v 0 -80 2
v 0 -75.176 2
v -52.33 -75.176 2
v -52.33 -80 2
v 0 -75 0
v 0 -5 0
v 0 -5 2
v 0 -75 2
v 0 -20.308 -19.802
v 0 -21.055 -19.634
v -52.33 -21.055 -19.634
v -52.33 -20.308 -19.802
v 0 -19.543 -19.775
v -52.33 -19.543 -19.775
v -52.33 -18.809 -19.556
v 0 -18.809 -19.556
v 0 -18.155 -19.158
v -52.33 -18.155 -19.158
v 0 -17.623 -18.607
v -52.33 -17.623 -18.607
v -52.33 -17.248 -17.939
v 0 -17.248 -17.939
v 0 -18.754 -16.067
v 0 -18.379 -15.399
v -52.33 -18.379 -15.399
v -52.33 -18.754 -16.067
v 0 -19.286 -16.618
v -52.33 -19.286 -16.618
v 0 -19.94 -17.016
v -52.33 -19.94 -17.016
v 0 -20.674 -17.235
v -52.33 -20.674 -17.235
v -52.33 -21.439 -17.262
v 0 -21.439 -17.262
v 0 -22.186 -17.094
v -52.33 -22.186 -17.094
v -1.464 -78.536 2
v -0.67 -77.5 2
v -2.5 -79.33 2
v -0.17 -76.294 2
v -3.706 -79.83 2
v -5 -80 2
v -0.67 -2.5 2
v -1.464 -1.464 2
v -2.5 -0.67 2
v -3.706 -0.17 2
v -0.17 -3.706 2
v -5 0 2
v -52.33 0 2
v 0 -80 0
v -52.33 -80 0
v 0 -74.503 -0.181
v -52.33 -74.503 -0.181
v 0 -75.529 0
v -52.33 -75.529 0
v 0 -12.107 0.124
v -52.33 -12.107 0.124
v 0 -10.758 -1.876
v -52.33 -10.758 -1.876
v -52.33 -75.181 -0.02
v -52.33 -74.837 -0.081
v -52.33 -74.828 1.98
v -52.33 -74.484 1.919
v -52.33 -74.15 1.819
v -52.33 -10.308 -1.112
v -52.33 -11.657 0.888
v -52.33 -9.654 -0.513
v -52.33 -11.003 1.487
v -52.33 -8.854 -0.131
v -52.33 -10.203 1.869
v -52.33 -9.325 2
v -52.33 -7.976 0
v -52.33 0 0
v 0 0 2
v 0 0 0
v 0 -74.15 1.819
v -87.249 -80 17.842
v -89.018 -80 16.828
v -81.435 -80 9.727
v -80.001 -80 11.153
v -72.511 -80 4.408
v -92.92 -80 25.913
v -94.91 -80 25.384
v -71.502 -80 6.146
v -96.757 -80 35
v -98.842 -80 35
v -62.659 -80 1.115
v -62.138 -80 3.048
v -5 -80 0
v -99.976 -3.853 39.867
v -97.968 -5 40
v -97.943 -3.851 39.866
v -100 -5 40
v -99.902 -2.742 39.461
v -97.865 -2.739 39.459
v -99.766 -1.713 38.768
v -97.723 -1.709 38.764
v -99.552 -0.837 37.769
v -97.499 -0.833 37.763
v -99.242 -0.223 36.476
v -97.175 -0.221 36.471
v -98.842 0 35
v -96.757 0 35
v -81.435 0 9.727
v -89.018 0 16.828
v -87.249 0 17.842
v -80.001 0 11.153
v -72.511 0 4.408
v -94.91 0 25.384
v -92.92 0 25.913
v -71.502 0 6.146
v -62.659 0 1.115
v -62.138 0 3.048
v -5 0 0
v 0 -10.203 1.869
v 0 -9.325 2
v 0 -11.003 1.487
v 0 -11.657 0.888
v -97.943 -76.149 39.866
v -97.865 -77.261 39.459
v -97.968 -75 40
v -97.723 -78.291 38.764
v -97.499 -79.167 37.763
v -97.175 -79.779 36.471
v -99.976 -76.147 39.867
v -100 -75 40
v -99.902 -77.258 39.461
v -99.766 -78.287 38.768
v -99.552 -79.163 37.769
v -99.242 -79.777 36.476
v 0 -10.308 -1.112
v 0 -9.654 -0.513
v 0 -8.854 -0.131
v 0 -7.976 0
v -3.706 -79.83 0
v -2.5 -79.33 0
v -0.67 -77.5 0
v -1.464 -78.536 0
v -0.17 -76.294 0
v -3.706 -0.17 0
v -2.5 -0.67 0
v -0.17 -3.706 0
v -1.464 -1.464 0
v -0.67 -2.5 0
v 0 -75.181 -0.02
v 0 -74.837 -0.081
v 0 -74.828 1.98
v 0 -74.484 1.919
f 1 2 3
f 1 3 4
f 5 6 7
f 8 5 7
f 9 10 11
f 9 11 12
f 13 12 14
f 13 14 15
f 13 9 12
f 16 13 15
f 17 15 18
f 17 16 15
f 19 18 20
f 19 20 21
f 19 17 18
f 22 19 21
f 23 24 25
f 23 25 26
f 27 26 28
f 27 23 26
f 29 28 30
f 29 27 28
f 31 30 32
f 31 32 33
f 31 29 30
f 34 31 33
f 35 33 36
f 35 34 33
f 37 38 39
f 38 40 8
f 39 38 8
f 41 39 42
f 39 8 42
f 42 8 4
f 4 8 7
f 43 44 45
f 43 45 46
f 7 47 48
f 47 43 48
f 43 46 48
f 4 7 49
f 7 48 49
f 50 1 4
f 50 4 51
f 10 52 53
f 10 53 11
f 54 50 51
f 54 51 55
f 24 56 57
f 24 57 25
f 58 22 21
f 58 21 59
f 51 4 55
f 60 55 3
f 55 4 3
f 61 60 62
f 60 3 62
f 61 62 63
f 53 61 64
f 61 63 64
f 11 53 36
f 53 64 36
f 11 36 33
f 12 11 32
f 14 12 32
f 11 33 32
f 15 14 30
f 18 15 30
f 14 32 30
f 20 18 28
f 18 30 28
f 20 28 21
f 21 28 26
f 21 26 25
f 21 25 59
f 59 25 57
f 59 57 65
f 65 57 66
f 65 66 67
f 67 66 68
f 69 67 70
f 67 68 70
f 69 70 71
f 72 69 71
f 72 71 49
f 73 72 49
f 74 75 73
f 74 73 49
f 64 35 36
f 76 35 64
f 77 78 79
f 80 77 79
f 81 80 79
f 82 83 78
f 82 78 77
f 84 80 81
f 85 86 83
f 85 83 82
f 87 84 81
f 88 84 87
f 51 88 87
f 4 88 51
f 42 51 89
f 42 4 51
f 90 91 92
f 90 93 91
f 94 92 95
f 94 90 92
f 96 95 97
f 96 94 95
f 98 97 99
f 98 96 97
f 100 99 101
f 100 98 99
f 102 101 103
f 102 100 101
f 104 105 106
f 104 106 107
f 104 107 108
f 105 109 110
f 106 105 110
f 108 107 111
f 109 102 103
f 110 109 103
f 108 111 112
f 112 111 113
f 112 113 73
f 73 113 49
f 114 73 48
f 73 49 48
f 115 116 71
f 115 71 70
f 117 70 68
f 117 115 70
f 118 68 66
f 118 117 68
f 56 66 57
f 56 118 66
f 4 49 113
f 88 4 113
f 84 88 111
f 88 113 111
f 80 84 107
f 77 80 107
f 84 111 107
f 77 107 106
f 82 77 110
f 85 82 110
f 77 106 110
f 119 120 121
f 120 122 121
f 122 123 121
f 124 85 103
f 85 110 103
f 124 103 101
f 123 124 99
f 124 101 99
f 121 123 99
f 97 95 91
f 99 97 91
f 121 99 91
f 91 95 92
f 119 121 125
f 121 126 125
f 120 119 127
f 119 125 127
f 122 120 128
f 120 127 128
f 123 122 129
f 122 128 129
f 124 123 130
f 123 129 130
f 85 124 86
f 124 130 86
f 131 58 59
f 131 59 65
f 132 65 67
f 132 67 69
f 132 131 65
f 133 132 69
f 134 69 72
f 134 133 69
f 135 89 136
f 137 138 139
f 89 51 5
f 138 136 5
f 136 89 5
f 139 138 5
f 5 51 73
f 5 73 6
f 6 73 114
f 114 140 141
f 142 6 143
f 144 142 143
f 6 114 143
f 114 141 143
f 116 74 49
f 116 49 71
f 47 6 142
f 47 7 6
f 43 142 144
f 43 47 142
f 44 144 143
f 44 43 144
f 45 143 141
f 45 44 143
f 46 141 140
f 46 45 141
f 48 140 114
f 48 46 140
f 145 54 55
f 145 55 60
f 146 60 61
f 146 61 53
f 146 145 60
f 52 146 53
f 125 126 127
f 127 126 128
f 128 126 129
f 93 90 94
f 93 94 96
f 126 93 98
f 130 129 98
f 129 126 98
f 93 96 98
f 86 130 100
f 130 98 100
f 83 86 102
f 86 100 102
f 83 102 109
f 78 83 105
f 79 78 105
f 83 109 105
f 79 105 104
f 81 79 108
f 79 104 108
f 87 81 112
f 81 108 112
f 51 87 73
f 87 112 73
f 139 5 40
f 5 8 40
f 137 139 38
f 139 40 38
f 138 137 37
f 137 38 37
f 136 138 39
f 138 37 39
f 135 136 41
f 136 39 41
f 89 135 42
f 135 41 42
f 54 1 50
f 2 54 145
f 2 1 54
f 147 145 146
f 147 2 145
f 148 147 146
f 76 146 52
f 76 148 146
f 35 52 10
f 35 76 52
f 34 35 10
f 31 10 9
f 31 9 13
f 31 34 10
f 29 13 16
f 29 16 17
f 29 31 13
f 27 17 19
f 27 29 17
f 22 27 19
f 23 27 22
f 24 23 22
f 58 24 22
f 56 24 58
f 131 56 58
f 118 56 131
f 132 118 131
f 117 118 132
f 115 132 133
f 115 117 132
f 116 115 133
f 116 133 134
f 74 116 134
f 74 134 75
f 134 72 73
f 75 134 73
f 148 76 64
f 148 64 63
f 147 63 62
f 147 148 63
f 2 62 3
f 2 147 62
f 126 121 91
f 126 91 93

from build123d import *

# Parameters (mm, degrees)
F1_DEPTH = 80
F2_R     = 5
F5_DEPTH = 52.3298562962


with BuildPart() as f1:
    # F0 (on Front) → F1 (new body)
    with BuildSketch(Plane.XZ):
        with BuildLine():
            Line((-52.3298562962, 0), (0, 0))
            Line((0, 0), (0, 2))
            Line((0, 2), (-52.3298562962, 2))
            ThreePointArc((-52.3298562962, 2), (-82.0233760889, 12.7436715119), (-97.9677842805, 40))
            Line((-97.9677842805, 40), (-100, 40))
            ThreePointArc((-100, 40), (-83.4443328334, 11.3247433143), (-52.3298562962, 0))
        make_face()
    extrude(amount=F1_DEPTH)

    # F2
    f2_edges = [f1.edges().sort_by_distance(p)[0] for p in [
        (-98.983892, -80, 40),
        (-98.983892, 0, 40),
        (0, -80, 1),
        (0, 0, 1),
    ]]
    fillet(f2_edges, radius=F2_R)


with BuildPart() as f5:
    # F3 (on Right) → F5 (new body, through all)
    with BuildSketch(Plane.YZ):
        with BuildLine():
            ThreePointArc((-75.5289809421, 0), (-75.0080364091, -0.045576741), (-74.5029205121, -0.1809221376))
            Line((-74.5029205121, -0.1809221376), (-21.055423179, -19.6342202629))
            ThreePointArc((-21.055423179, -19.6342202629), (-18.8091528198, -19.5557787735), (-17.2478111853, -17.9389621808))
            Line((-17.2478111853, -17.9389621808), (-10.7580260132, -1.8761802198))
            ThreePointArc((-10.7580260132, -1.8761802198), (-9.6540531599, -0.5128872823), (-7.9764744495, 0))
            Line((-7.9764744495, 0), (0, 0))
            Line((0, 0), (0, 2))
            Line((0, 2), (-9.3254914832, 2))
            ThreePointArc((-9.3254914832, 2), (-11.0030701936, 1.4871127177), (-12.1070430469, 0.1238197802))
            Line((-12.1070430469, 0.1238197802), (-18.37867213, -15.3990069129))
            ThreePointArc((-18.37867213, -15.3990069129), (-19.9400137645, -17.0158235056), (-22.1862841237, -17.094264995))
            Line((-22.1862841237, -17.094264995), (-74.1502665507, 1.8190778624))
            ThreePointArc((-74.1502665507, 1.8190778624), (-74.6553824477, 1.954423259), (-75.1763269807, 2))
            Line((-75.1763269807, 2), (-80, 2))
            Line((-80, 2), (-80, 0))
            Line((-80, 0), (-75.5289809421, 0))
        make_face()
    extrude(amount=-F5_DEPTH)


solid = Compound([f1.part, f5.part])
